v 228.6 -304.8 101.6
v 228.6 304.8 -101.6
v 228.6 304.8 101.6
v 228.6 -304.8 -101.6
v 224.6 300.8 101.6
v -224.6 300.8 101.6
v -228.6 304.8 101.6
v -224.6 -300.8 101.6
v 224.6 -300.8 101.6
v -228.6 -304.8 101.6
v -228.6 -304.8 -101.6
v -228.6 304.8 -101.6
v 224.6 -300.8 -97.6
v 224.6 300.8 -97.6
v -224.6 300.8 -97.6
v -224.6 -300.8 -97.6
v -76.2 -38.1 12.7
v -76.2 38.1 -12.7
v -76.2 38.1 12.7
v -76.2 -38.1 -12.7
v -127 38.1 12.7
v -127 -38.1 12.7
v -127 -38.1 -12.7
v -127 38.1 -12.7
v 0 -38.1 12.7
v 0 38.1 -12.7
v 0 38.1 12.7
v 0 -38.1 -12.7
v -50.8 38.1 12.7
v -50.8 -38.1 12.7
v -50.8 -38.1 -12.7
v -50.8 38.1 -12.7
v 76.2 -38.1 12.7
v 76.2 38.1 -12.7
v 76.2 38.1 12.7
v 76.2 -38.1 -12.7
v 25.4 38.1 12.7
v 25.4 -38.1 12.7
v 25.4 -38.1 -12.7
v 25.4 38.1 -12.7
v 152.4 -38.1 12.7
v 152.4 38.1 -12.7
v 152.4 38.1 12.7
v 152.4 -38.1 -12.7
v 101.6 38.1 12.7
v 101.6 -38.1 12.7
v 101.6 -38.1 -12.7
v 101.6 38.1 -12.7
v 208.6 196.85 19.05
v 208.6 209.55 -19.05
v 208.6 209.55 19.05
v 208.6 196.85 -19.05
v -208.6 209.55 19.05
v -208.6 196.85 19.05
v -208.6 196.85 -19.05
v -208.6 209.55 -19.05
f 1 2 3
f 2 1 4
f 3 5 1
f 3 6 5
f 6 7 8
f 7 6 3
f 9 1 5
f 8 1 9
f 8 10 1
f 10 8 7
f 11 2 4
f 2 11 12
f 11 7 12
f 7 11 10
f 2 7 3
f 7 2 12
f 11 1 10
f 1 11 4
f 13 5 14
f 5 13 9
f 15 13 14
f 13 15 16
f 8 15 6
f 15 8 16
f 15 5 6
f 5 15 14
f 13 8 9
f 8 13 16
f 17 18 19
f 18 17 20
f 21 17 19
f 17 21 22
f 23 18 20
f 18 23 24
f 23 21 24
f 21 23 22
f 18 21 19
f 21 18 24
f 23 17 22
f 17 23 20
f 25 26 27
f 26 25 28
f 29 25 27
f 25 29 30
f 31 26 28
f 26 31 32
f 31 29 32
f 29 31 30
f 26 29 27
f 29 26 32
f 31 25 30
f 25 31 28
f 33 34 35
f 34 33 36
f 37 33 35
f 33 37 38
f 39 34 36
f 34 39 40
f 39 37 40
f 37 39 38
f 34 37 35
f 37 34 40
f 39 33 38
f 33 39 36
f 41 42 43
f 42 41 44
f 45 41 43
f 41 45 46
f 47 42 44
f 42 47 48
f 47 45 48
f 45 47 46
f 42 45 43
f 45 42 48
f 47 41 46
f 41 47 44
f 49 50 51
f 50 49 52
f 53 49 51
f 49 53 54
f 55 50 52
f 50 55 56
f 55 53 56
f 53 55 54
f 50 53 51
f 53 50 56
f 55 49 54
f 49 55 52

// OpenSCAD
// File Path: src/hardware/univac_power_chassis.scad
// =========================================================================
// UNIVAC IX INDUSTRIAL SYSTEMS — HARDENED POWER CHASSIS CONFIGURATION
// Aerospace-Inspired Welded Double Seam Weatherproof Sub-Station Panel
// Mating Boundaries Derived from Project Mercury Pressure Vessel Layouts
// =========================================================================

$fn = 100; // Enforce high-precision circle rendering loops

// --- Physical Unit Conversions & Sizing (Millimeters) ---
inch = 25.4;
chassis_width  = 18.0 * inch; // Standard compact substation footprint (~457mm)
chassis_length = 24.0 * inch; // ~609mm vertical panel run
chassis_depth  = 8.0 * inch;  // ~203mm internal stack depth
wall_thickness = 4.0;         // 4mm Marine-Grade 316 Stainless Steel plate

// --- Welded Double Seam Geometry Arrays ---
seam_width = 3.0;            // Width of individual laser-weld passes
seam_gap   = 4.5;            // Trapped inert gas buffer gap between the twin seams

module main_power_enclosure_housing() {
    difference() {
        // Main outer structural protective block shell
        cube([chassis_width, chassis_length, chassis_depth], center = true);
        
        // Internal hollow bay housing circuit breakers and solid-state drivers
        translate([0, 0, wall_thickness])
            cube([chassis_width - (wall_thickness * 2), 
                  chassis_length - (wall_thickness * 2), 
                  chassis_depth], center = true);
                  
        // Mill the specialized aerospace dual-concentric structural weld tracks
        translate([0, 0, (chassis_depth / 2) - 1])
            welded_double_seam_profile();
    }
}

module welded_double_seam_profile() {
    // Inner primary hermetic laser-weld seam loop line
    difference() {
        square([chassis_width - 8, chassis_length - 8], center = true);
        square([chassis_width - 8 - (seam_width * 2), chassis_length - 8 - (seam_width * 2)], center = true);
    }
    
    // Outer secondary backup safety shield weld seam loop line
    // Traps an inert nitrogen cushion between the seams to eliminate condensation
    difference() {
        square([chassis_width - 8 + (seam_gap * 2), chassis_length - 8 + (seam_gap * 2)], center = true);
        square([chassis_width - 8 + (seam_gap * 2) - (seam_width * 2), chassis_length - 8 + (seam_gap * 2) - (seam_width * 2)], center = true);
    }
}

module internal_power_distribution_rail_layout() {
    // 1. High-Current Solid-State Input Bus Bar (240V AC / 100A Rail)
    color("Gold") translate([0, 8*inch, 0])
        cube([chassis_width - 40, 0.5*inch, 1.5*inch], center = true);
        
    // 2. Automated Solid-State Actuator Dispatches Array
    // Dedicated load points powering utility devices clear of mechanical linkages
    color("DarkDarkGrey") {
        translate([-4*inch, 0, 0]) cube([2*inch, 3*inch, 1*inch], center = true); // Load 01: Door Openers
        translate([-1*inch, 0, 0]) cube([2*inch, 3*inch, 1*inch], center = true); // Load 02: Garage Gates
        translate([2*inch, 0, 0])  cube([2*inch, 3*inch, 1*inch], center = true); // Load 03: Industrial Mixers
        translate([5*inch, 0, 0])  cube([2*inch, 3*inch, 1*inch], center = true); // Load 04: Solenoid Locks
    }
}

// Render the composite structural assembly overview
color("SteelBlue") main_power_enclosure_housing();
internal_power_distribution_rail_layout();
